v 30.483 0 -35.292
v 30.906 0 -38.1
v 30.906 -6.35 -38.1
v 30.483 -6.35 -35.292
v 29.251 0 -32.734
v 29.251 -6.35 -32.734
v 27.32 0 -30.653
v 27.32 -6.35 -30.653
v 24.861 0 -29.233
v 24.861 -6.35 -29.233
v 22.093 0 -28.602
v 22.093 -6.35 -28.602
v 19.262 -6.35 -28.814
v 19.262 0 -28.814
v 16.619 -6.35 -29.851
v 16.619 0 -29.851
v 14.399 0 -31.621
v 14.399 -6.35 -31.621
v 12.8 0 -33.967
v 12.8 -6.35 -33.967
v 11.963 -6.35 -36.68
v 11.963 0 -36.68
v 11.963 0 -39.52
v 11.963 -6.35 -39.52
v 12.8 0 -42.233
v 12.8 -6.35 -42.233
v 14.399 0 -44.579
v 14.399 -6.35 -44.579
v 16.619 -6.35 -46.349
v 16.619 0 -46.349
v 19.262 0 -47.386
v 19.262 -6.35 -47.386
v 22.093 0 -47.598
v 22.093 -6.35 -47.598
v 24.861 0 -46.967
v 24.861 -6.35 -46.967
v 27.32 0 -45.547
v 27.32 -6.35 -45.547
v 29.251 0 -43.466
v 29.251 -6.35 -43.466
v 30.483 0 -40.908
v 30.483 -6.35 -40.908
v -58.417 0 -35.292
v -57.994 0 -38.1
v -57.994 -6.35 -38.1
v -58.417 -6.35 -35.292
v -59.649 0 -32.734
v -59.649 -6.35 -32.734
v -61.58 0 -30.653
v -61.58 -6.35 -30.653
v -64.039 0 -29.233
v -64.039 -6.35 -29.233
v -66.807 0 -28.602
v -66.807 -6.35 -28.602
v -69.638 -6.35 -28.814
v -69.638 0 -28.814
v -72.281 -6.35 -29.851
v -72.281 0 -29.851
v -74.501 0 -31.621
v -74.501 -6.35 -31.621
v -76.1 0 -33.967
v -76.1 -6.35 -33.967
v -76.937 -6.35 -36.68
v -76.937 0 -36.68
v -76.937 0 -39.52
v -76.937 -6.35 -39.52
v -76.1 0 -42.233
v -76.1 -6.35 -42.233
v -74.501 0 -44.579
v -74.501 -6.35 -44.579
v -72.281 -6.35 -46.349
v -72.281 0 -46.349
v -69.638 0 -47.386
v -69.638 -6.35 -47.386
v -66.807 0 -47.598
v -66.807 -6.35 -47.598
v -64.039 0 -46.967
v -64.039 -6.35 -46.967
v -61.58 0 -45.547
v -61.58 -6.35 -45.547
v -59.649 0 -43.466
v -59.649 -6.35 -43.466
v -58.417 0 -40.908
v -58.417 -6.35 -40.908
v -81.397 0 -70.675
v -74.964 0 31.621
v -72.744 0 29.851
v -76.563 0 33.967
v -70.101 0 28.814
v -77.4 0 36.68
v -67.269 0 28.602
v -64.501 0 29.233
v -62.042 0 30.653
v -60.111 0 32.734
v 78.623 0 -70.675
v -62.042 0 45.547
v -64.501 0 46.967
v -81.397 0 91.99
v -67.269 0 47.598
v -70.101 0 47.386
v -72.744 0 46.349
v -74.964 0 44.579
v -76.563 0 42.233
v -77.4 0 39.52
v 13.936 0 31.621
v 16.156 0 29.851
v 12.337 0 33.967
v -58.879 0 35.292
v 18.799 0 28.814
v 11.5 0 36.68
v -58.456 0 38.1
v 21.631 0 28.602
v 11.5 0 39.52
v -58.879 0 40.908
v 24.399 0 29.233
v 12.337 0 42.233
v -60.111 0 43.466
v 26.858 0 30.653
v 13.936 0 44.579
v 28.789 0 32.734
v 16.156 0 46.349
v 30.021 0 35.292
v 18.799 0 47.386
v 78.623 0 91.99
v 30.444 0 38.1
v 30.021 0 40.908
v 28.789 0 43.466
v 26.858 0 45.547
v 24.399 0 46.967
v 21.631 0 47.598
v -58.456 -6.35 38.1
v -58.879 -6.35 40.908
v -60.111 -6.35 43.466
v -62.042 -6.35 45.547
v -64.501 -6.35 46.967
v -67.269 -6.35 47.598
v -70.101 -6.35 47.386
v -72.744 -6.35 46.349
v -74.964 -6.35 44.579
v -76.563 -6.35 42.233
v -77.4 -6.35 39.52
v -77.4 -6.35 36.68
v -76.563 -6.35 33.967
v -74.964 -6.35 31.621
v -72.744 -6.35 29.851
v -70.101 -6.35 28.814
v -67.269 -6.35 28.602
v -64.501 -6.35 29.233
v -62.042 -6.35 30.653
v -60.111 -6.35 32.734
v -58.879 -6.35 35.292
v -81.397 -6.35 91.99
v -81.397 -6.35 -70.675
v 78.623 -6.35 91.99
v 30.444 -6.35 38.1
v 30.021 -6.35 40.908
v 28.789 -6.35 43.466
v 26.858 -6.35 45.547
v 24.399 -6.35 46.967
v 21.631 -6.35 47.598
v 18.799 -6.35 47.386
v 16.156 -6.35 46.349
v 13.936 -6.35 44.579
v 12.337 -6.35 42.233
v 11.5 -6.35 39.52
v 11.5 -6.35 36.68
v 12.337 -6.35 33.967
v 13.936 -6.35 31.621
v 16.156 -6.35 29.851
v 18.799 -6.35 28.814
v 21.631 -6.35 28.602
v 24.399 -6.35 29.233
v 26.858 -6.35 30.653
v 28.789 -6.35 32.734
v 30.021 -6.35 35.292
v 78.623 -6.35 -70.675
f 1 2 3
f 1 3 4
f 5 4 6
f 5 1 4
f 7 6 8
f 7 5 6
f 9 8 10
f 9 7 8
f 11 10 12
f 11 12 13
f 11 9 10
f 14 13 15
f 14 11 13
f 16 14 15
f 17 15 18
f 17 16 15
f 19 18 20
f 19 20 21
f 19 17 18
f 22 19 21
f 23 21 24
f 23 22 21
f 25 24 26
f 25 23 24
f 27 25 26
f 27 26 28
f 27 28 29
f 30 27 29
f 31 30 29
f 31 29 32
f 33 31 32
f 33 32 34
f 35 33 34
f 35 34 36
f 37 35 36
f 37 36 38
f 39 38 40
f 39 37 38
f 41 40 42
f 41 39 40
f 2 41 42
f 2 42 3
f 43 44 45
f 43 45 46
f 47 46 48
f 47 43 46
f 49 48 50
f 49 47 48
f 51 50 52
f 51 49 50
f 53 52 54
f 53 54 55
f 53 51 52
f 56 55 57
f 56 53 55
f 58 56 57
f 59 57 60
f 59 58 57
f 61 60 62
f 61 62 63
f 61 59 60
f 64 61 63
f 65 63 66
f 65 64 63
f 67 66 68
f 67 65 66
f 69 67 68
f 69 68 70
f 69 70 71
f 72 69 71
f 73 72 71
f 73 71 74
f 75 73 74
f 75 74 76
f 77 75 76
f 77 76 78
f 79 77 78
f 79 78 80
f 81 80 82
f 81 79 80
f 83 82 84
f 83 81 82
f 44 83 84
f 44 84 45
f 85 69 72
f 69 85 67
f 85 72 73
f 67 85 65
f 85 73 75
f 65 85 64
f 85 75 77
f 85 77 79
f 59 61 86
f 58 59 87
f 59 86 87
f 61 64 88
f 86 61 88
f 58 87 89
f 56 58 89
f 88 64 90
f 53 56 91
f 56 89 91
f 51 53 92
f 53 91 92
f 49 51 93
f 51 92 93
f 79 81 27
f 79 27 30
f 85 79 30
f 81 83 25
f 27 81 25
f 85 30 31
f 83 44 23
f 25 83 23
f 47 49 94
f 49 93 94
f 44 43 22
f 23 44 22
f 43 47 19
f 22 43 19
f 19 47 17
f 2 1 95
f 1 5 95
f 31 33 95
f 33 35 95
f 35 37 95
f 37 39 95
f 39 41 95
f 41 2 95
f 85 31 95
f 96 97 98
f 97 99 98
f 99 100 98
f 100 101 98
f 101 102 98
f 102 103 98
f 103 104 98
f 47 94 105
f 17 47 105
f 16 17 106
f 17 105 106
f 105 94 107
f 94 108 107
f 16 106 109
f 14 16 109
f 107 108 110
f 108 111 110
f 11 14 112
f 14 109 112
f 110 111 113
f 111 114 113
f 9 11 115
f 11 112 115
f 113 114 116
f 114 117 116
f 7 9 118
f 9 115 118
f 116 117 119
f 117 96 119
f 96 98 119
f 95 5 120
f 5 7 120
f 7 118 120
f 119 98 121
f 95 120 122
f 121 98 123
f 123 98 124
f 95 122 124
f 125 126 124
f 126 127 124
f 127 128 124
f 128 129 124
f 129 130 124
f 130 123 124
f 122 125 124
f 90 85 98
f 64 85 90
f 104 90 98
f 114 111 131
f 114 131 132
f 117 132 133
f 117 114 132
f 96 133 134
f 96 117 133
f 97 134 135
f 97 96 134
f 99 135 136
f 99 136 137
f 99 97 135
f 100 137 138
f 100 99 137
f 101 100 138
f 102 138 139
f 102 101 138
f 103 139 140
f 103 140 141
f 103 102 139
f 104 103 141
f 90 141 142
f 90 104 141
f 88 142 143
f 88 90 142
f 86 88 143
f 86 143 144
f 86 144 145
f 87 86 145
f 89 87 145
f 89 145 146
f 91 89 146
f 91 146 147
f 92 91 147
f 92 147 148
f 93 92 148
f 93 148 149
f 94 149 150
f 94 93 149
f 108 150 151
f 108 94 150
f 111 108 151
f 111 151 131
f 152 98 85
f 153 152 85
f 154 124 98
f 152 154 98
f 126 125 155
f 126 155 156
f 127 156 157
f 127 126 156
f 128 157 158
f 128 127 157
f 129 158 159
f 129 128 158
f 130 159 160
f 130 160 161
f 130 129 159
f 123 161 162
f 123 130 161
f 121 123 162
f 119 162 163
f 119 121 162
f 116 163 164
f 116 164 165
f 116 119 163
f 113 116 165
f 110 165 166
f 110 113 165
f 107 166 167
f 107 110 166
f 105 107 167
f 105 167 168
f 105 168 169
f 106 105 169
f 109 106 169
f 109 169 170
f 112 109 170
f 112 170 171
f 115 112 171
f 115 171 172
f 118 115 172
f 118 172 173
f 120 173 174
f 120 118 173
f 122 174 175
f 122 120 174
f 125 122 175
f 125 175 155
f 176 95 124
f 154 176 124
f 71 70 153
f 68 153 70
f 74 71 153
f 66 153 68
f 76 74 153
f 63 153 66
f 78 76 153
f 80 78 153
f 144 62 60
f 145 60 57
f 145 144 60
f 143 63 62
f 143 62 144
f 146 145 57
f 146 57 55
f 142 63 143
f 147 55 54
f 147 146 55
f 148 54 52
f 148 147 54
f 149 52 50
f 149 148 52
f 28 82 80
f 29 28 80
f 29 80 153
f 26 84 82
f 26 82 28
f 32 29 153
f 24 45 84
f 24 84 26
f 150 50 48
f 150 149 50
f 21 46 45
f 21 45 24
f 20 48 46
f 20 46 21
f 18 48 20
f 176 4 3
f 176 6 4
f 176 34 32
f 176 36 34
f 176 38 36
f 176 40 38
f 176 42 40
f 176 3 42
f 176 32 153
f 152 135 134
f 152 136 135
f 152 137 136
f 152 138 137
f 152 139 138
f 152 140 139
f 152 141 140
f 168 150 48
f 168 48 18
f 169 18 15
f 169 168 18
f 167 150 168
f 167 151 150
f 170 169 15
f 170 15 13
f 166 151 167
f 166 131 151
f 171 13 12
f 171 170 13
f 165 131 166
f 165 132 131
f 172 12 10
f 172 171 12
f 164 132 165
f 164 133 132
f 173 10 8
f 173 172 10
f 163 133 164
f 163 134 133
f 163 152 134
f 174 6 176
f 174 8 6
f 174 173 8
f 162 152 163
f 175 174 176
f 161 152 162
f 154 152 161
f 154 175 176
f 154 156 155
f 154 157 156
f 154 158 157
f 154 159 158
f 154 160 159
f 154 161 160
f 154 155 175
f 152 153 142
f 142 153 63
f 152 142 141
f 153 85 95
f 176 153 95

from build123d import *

# Parameters (mm, degrees)
F0_R     = 9.525
F0_W     = 136.144
F0_H     = 30.48
F0_W_2   = 23.876
F1_DEPTH = 6.35


with BuildPart() as f1:
    # F0 (on Front) → F1 (new body)
    with BuildSketch(Plane.XZ):
        Polygon((78.622635, 91.990085), (-81.397365, 91.990085), (-81.397365, 15.24), (54.746635, 15.24), (78.622635, 15.24), align=None)
        with Locations((-67.981206, 38.1)):
            Circle(F0_R, mode=Mode.SUBTRACT)
        with Locations((20.918794, 38.1)):
            Circle(F0_R, mode=Mode.SUBTRACT)
        with Locations((-13.325365, 0)):
            Rectangle(F0_W, F0_H)
        with Locations((66.684635, 0)):
            Rectangle(F0_W_2, F0_H)
        Polygon((54.746635, -15.24), (-81.397365, -15.24), (-81.397365, -70.67487), (78.622635, -70.67487), (78.622635, -15.24), align=None)
        with Locations((-67.518748, -38.1)):
            Circle(F0_R, mode=Mode.SUBTRACT)
        with Locations((21.381252, -38.1)):
            Circle(F0_R, mode=Mode.SUBTRACT)
    extrude(amount=F1_DEPTH)


solid = f1.part
